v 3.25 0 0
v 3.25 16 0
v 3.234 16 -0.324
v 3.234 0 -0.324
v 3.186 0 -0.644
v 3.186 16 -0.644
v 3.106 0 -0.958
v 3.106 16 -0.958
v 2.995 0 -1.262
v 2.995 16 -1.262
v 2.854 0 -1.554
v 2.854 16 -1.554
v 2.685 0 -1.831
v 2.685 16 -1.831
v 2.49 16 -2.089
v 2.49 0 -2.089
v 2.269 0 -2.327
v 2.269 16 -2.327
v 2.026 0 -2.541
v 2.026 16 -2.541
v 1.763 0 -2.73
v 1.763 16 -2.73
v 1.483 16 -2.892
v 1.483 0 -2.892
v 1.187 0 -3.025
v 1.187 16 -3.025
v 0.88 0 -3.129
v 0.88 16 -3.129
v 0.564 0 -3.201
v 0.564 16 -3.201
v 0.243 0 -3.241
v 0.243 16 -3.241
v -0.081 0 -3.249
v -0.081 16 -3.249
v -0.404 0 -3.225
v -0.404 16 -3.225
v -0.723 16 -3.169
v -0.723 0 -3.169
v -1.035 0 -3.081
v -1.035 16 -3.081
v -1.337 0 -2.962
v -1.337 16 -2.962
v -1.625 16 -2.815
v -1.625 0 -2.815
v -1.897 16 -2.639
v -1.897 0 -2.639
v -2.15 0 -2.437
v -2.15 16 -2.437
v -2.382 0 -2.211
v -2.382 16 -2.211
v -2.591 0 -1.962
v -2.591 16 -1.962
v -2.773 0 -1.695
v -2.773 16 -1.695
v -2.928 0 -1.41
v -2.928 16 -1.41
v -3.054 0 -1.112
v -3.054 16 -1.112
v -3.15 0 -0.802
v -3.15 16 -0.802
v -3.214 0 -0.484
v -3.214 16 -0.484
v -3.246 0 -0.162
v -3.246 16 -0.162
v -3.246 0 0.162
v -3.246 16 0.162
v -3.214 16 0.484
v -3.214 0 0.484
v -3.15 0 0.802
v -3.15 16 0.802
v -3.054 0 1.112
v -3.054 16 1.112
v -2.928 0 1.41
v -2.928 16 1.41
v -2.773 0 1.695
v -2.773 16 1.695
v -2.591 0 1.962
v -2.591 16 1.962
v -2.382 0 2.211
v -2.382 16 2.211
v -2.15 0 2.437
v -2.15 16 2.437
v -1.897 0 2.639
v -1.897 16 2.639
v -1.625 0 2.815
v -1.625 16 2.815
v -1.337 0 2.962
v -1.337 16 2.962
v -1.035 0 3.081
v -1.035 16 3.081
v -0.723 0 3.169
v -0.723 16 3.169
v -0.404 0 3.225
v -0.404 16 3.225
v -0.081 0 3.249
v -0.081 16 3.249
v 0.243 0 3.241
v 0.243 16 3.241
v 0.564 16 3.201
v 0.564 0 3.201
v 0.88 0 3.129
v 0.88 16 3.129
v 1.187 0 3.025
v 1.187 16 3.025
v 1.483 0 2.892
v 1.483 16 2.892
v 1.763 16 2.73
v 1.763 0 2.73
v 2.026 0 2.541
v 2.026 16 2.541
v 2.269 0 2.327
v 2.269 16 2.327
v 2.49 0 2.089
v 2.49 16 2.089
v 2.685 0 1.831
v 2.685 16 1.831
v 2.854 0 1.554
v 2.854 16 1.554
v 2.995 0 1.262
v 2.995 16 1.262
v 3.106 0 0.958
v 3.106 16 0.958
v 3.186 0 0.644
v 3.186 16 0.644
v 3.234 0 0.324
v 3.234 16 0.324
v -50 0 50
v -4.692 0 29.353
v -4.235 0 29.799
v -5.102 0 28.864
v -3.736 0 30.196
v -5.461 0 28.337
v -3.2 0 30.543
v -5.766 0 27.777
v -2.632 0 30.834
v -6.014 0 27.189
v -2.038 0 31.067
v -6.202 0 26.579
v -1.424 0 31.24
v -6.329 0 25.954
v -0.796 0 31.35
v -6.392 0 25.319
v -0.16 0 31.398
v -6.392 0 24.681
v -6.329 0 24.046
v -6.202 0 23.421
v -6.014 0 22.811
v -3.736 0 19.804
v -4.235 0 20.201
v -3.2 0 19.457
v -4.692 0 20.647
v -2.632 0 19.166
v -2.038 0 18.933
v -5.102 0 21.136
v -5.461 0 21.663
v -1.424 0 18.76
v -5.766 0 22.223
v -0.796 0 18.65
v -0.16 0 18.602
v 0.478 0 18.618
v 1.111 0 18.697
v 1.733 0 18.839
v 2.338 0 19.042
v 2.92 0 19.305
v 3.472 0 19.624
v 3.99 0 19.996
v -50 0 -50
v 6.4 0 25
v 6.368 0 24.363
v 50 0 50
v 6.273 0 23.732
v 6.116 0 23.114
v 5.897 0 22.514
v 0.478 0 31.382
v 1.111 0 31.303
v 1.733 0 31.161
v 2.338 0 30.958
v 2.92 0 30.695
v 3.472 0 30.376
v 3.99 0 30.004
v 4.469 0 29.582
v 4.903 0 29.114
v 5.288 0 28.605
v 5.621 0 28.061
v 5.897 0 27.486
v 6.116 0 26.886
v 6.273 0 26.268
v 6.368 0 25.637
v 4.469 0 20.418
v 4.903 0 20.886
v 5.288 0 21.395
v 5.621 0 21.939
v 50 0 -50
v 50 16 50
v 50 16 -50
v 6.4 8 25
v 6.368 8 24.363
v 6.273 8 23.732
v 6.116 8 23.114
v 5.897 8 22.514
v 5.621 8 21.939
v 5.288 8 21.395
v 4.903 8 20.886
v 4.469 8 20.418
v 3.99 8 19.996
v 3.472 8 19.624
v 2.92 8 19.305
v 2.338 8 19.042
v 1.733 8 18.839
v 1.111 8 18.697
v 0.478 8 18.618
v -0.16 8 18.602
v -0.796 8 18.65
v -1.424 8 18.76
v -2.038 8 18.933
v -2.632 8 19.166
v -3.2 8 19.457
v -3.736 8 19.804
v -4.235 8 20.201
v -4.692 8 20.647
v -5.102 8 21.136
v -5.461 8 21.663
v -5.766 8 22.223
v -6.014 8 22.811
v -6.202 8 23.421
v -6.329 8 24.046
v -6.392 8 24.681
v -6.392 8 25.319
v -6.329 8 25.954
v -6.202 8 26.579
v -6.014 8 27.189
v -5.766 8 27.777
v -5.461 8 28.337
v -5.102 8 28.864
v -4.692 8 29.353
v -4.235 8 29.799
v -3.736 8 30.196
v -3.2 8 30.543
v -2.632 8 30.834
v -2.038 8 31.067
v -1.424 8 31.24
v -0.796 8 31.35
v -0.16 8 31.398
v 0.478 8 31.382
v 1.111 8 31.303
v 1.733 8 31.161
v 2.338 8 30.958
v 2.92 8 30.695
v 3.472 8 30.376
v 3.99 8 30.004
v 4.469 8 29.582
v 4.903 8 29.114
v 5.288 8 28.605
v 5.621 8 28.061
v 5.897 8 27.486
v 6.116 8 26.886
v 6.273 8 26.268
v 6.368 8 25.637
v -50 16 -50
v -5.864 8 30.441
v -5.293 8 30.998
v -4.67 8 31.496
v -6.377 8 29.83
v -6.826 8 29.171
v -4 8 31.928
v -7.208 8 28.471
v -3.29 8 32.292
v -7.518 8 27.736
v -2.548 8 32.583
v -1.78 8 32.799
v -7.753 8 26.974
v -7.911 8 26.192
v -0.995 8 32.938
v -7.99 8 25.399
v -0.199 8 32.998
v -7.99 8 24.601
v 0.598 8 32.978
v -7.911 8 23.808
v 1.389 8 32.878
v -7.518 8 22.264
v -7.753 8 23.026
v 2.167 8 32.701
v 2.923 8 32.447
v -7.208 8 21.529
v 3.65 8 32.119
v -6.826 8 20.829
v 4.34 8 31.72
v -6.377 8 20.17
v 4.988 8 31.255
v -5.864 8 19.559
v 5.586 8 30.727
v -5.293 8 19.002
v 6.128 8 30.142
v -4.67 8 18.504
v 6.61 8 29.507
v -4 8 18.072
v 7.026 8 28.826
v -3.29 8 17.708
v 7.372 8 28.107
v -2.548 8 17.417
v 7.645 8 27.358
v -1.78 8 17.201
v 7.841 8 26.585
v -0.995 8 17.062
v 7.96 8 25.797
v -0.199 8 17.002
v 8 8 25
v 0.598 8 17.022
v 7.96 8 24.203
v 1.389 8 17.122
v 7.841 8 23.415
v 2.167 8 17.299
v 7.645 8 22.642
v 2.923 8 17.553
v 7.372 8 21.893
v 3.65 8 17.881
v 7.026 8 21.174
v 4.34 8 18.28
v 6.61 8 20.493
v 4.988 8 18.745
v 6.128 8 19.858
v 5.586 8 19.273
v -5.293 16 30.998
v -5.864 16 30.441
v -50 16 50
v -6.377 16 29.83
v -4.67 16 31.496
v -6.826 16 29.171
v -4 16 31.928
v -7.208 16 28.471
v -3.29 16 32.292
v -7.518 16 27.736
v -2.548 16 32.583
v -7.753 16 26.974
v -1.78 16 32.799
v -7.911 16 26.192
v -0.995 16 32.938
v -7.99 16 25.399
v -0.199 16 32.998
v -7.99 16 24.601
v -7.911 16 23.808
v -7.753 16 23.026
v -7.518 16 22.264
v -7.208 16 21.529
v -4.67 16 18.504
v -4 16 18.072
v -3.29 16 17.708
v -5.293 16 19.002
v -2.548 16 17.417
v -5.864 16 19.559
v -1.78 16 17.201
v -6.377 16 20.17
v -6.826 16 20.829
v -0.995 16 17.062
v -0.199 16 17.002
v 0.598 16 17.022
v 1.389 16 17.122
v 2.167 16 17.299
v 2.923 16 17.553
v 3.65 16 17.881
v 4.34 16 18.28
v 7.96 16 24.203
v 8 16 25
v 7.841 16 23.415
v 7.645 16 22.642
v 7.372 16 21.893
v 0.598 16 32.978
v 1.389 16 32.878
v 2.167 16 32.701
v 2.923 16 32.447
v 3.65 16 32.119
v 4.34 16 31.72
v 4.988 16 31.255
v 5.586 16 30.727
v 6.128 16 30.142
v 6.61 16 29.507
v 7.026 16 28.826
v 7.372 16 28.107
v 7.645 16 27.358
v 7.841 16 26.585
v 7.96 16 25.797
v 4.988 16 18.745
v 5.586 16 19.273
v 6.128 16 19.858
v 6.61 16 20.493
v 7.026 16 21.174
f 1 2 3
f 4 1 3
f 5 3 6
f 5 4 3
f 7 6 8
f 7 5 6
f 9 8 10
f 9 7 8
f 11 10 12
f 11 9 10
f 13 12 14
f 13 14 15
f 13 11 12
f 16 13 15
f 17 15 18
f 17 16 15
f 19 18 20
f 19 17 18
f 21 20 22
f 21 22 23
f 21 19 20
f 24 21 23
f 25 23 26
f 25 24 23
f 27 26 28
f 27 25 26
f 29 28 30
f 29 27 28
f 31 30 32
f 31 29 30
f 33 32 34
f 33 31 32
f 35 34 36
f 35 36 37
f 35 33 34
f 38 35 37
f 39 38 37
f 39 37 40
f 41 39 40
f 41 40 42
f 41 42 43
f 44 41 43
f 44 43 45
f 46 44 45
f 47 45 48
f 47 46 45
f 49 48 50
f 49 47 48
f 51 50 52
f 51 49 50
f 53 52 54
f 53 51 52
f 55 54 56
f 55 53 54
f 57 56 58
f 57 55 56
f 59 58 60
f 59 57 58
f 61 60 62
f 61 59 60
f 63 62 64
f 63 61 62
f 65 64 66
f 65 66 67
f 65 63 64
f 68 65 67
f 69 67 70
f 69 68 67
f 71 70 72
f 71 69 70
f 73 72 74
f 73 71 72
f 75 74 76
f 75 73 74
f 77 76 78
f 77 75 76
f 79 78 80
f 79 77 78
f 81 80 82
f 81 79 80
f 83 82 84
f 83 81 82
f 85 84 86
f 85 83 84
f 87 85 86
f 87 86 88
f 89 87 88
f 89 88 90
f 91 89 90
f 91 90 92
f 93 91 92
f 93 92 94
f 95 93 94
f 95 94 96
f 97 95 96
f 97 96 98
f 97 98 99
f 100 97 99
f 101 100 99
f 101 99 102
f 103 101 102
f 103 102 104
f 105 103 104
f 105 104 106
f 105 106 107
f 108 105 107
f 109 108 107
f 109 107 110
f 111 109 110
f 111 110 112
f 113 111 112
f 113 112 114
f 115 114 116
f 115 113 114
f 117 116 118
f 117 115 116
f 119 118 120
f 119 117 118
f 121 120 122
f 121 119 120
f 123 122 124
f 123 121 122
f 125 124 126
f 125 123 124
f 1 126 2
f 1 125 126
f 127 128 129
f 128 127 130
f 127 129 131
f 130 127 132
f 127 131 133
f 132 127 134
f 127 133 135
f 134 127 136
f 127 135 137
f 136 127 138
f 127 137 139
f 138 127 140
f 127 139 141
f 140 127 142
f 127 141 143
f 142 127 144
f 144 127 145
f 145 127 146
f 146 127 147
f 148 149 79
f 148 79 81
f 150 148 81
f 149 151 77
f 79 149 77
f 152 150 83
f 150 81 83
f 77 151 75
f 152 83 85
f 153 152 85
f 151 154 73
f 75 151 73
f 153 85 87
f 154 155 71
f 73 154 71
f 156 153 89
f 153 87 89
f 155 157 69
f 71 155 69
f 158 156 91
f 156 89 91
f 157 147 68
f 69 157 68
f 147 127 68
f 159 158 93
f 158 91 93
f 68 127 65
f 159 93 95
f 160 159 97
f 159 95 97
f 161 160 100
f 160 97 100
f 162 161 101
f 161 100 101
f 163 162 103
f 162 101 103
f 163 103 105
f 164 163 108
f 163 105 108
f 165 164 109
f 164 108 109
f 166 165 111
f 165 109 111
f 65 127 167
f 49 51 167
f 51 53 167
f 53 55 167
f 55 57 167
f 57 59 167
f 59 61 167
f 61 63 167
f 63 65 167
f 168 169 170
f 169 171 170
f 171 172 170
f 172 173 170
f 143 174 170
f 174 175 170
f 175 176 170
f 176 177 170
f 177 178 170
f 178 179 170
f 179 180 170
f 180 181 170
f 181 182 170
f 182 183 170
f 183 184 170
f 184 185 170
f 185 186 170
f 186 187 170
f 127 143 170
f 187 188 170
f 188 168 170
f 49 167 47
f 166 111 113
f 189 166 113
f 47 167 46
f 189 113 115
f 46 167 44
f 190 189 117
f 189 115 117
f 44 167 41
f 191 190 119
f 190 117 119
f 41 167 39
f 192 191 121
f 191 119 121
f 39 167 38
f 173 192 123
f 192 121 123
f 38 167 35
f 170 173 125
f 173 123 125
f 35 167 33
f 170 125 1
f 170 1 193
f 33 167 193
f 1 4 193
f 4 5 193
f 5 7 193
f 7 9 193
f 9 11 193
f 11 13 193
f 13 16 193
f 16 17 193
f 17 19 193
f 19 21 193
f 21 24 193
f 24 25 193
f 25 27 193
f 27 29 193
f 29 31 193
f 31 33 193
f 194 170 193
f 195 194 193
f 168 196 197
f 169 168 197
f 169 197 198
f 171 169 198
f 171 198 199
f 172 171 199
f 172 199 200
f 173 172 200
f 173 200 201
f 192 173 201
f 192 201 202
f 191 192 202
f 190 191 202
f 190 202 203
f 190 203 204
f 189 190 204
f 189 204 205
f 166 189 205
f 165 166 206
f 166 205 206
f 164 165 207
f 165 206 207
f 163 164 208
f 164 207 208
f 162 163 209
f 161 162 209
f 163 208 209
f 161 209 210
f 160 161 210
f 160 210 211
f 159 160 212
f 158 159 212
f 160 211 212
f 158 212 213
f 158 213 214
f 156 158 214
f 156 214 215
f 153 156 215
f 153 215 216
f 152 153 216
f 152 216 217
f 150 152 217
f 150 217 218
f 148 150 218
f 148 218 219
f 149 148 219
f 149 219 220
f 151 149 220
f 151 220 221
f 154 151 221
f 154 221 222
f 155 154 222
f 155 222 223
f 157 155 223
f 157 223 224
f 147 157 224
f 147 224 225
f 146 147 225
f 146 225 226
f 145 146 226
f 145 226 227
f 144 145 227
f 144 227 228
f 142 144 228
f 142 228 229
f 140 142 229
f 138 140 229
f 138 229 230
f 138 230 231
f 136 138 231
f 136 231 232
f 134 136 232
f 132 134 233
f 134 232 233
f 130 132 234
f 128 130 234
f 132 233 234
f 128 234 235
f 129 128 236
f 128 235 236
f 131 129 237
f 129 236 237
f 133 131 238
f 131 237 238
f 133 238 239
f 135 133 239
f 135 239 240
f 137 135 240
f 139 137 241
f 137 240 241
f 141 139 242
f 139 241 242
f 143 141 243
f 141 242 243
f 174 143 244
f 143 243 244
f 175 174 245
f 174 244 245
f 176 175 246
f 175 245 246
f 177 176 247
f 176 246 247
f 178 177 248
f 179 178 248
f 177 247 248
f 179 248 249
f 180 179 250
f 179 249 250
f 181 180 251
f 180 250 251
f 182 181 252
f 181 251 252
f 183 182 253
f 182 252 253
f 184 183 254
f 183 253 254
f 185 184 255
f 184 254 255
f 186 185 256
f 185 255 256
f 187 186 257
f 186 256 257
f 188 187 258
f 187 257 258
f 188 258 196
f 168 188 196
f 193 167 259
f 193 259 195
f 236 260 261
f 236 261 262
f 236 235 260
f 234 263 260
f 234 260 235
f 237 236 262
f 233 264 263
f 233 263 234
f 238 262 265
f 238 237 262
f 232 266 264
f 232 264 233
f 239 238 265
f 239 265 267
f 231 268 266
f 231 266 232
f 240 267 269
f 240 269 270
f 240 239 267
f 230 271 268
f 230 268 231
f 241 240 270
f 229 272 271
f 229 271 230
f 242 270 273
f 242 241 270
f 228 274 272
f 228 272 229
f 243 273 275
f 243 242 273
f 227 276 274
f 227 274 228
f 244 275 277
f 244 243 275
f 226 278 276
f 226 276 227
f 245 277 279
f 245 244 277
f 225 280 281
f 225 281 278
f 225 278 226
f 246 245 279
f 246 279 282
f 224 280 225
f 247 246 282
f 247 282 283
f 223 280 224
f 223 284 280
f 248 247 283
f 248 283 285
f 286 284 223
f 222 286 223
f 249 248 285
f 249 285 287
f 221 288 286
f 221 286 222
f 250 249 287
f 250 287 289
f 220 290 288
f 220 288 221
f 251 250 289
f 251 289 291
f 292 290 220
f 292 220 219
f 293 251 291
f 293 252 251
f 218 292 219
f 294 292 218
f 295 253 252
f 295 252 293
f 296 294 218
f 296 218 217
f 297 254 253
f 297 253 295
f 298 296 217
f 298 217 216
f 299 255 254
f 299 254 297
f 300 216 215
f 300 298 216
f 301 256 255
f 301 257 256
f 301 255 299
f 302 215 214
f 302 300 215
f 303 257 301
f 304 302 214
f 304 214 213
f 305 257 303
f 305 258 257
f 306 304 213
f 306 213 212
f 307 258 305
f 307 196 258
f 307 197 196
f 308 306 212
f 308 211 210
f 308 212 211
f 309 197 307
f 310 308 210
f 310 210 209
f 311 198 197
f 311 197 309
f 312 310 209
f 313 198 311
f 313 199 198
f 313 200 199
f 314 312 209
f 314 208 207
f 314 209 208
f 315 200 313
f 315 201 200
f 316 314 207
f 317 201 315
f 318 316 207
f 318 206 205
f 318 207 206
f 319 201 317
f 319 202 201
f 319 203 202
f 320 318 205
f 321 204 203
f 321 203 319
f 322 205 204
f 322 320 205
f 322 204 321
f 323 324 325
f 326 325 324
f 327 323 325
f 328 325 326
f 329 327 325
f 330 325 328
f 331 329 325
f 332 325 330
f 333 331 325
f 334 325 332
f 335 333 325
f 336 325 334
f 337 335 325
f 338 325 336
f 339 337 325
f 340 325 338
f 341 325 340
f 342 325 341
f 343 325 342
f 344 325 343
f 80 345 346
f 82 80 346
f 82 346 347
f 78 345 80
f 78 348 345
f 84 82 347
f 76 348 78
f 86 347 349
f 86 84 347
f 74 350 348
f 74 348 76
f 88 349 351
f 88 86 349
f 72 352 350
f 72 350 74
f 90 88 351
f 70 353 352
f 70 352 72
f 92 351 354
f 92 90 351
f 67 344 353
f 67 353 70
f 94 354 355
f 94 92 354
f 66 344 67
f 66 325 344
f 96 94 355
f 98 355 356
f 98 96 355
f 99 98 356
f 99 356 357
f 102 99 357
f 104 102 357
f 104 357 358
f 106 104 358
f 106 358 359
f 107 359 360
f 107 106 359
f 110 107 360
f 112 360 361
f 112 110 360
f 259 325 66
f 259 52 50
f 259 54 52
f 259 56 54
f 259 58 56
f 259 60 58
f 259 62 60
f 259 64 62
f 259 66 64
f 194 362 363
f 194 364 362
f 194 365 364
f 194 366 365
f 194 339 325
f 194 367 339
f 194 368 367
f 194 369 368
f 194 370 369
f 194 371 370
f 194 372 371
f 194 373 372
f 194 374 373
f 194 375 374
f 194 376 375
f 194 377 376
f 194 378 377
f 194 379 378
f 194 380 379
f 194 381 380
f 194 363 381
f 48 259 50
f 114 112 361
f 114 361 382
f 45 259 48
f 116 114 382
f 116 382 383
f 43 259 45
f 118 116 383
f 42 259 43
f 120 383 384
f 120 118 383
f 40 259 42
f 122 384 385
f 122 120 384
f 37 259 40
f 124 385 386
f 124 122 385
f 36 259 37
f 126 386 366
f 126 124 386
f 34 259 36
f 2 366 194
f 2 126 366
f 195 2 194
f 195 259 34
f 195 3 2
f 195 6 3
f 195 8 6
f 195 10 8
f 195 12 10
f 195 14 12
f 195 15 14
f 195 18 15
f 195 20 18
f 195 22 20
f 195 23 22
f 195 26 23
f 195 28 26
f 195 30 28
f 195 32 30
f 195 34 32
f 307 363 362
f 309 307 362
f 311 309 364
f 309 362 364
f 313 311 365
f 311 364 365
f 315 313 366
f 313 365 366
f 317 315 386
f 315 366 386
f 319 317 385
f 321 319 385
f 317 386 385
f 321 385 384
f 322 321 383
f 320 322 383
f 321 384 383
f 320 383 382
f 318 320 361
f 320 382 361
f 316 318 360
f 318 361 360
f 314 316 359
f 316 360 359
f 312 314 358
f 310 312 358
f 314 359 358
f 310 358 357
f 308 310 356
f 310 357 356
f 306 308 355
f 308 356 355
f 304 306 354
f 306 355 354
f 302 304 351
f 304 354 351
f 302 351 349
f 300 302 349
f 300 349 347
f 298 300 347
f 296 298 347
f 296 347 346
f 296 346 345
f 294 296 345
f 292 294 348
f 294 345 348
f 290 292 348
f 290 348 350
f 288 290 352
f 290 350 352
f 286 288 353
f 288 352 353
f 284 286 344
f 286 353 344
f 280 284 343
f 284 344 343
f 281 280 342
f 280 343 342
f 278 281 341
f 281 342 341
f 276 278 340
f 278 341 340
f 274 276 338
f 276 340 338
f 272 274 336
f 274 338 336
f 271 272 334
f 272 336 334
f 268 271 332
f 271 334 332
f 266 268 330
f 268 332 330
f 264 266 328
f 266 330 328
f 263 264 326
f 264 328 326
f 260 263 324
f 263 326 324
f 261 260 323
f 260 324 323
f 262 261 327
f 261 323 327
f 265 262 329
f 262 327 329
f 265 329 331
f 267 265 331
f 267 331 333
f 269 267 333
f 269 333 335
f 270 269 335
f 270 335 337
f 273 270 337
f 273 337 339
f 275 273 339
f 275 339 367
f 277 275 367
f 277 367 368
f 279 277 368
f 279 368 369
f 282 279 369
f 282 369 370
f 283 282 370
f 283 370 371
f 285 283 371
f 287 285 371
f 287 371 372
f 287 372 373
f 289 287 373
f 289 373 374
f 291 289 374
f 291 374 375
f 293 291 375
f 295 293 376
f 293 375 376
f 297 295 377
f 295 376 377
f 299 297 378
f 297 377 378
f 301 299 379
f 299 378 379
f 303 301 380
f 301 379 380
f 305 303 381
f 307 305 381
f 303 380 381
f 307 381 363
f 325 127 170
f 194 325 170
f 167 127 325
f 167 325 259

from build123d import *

# Parameters (mm, degrees)
SKETCH1_W           = 100
SKETCH1_H           = 100
SKETCH1_R           = 3.25
BOSS_EXTRUDE1_DEPTH = 16
SKETCH2_R           = 8
CUT_EXTRUDE1_DEPTH  = 8
CUT_EXTRUDE2_REACH  = 10
SKETCH3_R           = 6.4


with BuildPart() as part:
    # Sketch1 → Boss-Extrude1 (new body)
    with BuildSketch(Plane(origin=(0, 0, 0), x_dir=(1, 0, 0), z_dir=(0, 1, 0))):
        Rectangle(SKETCH1_W, SKETCH1_H)
        Circle(SKETCH1_R, mode=Mode.SUBTRACT)
    extrude(amount=BOSS_EXTRUDE1_DEPTH)

    # Sketch2 → Cut-Extrude1 (cut)
    with BuildSketch(Plane(origin=(0, 16, 0), x_dir=(1, 0, 0), z_dir=(0, 1, 0))):
        with Locations((0, -25)):
            Circle(SKETCH2_R)
    extrude(amount=-CUT_EXTRUDE1_DEPTH, mode=Mode.SUBTRACT)

    # Sketch3 → Cut-Extrude2 (cut, up to next)
    with BuildSketch(Plane(origin=(0, 8, 0), x_dir=(1, 0, 0), z_dir=(0, 1, 0)), mode=Mode.PRIVATE) as cut_extrude2_sk1:
        with Locations((0, -25)):
            Circle(SKETCH3_R)
    cut_extrude2_tool1 = extrude(cut_extrude2_sk1.sketch, amount=-CUT_EXTRUDE2_REACH, mode=Mode.PRIVATE) & part.part
    add(cut_extrude2_tool1.solids().sort_by_distance((0, 8, 25))[0], mode=Mode.SUBTRACT)


solid = part.part
